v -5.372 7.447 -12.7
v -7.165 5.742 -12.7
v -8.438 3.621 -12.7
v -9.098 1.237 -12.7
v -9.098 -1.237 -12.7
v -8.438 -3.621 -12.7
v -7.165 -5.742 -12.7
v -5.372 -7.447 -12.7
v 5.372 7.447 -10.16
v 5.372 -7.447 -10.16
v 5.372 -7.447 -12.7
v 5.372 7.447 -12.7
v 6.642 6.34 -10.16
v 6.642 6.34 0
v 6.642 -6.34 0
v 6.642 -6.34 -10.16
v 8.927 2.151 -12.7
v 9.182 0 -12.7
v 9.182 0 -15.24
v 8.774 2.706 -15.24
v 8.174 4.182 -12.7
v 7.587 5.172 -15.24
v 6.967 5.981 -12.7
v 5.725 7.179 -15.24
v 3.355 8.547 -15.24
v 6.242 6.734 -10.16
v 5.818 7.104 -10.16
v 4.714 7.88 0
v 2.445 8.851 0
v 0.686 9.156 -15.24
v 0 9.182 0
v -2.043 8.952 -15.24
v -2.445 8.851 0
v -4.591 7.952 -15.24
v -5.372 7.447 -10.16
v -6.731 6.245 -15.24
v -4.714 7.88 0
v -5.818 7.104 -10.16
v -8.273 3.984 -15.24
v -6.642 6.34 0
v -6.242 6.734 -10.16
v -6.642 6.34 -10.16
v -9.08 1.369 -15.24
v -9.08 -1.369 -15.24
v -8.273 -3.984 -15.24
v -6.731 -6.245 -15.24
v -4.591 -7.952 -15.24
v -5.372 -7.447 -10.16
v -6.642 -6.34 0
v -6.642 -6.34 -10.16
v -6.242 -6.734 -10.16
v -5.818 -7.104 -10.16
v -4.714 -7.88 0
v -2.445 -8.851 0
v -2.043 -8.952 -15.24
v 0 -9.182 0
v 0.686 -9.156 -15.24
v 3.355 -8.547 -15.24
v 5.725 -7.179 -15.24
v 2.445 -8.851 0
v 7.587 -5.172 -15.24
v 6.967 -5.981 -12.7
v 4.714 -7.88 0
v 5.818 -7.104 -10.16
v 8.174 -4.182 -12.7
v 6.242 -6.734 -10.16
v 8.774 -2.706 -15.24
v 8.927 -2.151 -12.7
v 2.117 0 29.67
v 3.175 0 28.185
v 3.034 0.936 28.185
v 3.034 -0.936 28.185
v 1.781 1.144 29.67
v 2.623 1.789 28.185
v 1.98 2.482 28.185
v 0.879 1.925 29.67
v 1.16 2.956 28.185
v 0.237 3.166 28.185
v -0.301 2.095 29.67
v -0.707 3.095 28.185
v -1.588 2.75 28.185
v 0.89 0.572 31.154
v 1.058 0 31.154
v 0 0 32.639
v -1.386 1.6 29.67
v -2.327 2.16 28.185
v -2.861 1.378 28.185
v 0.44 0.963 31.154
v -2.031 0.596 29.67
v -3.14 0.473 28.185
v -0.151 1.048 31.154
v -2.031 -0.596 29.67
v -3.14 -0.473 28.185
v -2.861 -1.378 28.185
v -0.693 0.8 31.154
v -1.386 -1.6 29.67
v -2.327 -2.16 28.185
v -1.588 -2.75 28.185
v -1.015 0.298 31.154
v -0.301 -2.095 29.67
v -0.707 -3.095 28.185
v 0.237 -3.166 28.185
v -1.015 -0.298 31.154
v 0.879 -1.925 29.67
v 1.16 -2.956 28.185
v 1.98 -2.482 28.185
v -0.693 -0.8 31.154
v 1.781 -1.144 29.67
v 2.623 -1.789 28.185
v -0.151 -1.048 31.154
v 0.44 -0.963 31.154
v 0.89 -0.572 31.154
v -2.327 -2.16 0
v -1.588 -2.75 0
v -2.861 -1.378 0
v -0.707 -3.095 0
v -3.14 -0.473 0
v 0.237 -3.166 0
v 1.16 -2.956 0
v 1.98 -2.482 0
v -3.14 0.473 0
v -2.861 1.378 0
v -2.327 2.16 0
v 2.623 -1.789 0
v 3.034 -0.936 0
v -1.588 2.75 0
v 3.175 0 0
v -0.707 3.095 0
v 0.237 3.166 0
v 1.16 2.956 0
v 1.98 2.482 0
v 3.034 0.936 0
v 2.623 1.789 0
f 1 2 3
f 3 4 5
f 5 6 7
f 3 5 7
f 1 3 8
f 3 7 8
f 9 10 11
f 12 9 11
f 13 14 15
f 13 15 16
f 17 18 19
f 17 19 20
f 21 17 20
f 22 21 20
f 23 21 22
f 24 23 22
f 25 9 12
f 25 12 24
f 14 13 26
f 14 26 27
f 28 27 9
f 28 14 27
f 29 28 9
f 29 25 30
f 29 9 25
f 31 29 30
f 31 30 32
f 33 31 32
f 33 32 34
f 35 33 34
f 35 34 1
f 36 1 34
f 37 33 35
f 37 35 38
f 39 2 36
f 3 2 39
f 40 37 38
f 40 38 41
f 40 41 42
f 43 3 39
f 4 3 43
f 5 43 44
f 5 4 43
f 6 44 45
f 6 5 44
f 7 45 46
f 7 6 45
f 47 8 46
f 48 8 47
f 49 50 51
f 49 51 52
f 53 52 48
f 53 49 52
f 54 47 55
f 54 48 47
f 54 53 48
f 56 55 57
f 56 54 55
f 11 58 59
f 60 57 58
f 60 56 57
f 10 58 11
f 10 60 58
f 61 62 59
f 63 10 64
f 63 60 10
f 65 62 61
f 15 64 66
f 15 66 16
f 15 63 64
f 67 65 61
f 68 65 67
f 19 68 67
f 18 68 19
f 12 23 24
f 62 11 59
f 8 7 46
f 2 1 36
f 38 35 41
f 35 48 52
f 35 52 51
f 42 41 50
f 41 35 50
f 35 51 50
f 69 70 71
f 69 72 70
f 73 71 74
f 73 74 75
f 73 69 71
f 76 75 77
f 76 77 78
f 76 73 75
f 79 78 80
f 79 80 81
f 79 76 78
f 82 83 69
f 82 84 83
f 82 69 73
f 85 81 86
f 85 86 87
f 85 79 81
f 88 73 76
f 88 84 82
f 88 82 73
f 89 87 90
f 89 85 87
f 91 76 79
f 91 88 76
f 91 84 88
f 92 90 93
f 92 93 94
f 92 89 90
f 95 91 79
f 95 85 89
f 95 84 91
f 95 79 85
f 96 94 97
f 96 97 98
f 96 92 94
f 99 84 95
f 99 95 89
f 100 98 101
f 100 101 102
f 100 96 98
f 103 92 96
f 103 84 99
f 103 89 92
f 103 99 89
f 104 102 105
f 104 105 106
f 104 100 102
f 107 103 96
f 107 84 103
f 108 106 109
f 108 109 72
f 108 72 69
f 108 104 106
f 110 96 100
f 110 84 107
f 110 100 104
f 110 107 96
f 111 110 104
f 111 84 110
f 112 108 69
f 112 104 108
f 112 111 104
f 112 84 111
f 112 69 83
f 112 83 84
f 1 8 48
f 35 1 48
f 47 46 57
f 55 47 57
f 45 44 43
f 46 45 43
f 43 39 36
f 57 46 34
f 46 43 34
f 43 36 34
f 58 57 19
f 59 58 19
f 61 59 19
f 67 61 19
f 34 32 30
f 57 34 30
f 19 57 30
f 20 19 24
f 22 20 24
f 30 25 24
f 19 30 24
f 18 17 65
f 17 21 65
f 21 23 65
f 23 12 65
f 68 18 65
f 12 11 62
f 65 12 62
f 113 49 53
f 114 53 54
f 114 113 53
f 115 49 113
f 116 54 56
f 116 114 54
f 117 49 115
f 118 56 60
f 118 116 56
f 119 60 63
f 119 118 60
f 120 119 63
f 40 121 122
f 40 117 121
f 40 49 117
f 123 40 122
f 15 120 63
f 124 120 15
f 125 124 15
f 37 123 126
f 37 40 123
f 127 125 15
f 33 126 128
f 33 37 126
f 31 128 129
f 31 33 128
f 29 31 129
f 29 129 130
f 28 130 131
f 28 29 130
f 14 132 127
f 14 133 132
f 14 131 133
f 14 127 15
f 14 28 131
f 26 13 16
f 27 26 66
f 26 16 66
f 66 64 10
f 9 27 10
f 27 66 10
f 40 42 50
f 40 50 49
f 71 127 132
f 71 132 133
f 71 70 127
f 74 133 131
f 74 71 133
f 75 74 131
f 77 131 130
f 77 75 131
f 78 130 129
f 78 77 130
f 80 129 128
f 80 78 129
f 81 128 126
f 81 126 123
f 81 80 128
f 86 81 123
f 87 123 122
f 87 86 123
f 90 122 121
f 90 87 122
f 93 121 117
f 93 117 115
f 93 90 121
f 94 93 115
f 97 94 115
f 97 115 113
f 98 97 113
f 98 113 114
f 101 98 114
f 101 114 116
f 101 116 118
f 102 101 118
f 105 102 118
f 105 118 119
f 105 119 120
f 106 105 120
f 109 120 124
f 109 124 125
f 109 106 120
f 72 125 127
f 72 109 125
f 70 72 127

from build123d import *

# Parameters (mm, degrees)
F0_R          = 9.1821
F1_DEPTH      = 15.24
F3_DEPTH      = 9.1831
F3_DEPTH_BACK = 9.1831


with BuildPart() as f1:
    # F0 (on Top) → F1 (new body)
    with BuildSketch(Plane.XY):
        Circle(F0_R)
    extrude(amount=-F1_DEPTH)

    # F2 (on Front) → F3 (cut, two sides)
    with BuildSketch(Plane.XZ) as f3_sk:
        Polygon((-9.1821, 0), (-9.1821, -12.7), (-6.6421, -12.7), (-5.3721, -12.7), (-5.3721, -10.16), (-6.6421, -10.16), (-6.6421, 0), align=None)
        Polygon((9.1821, -12.7), (9.1821, 0), (6.6421, 0), (6.6421, -10.16), (5.3721, -10.16), (5.3721, -12.7), (6.6421, -12.7), align=None)
    extrude(amount=-F3_DEPTH, mode=Mode.SUBTRACT)
    extrude(f3_sk.sketch, amount=F3_DEPTH_BACK, mode=Mode.SUBTRACT)

    # F4 (on Front) → F5 (revolve)
    with BuildSketch(Plane.XZ):
        Polygon((0, 32.639), (0, 0), (3.175, 0), (3.175, 28.1854718924), align=None)
    revolve(axis=Axis((0, 0, 15.3003977612), (0, 0, 1)))


solid = f1.part
